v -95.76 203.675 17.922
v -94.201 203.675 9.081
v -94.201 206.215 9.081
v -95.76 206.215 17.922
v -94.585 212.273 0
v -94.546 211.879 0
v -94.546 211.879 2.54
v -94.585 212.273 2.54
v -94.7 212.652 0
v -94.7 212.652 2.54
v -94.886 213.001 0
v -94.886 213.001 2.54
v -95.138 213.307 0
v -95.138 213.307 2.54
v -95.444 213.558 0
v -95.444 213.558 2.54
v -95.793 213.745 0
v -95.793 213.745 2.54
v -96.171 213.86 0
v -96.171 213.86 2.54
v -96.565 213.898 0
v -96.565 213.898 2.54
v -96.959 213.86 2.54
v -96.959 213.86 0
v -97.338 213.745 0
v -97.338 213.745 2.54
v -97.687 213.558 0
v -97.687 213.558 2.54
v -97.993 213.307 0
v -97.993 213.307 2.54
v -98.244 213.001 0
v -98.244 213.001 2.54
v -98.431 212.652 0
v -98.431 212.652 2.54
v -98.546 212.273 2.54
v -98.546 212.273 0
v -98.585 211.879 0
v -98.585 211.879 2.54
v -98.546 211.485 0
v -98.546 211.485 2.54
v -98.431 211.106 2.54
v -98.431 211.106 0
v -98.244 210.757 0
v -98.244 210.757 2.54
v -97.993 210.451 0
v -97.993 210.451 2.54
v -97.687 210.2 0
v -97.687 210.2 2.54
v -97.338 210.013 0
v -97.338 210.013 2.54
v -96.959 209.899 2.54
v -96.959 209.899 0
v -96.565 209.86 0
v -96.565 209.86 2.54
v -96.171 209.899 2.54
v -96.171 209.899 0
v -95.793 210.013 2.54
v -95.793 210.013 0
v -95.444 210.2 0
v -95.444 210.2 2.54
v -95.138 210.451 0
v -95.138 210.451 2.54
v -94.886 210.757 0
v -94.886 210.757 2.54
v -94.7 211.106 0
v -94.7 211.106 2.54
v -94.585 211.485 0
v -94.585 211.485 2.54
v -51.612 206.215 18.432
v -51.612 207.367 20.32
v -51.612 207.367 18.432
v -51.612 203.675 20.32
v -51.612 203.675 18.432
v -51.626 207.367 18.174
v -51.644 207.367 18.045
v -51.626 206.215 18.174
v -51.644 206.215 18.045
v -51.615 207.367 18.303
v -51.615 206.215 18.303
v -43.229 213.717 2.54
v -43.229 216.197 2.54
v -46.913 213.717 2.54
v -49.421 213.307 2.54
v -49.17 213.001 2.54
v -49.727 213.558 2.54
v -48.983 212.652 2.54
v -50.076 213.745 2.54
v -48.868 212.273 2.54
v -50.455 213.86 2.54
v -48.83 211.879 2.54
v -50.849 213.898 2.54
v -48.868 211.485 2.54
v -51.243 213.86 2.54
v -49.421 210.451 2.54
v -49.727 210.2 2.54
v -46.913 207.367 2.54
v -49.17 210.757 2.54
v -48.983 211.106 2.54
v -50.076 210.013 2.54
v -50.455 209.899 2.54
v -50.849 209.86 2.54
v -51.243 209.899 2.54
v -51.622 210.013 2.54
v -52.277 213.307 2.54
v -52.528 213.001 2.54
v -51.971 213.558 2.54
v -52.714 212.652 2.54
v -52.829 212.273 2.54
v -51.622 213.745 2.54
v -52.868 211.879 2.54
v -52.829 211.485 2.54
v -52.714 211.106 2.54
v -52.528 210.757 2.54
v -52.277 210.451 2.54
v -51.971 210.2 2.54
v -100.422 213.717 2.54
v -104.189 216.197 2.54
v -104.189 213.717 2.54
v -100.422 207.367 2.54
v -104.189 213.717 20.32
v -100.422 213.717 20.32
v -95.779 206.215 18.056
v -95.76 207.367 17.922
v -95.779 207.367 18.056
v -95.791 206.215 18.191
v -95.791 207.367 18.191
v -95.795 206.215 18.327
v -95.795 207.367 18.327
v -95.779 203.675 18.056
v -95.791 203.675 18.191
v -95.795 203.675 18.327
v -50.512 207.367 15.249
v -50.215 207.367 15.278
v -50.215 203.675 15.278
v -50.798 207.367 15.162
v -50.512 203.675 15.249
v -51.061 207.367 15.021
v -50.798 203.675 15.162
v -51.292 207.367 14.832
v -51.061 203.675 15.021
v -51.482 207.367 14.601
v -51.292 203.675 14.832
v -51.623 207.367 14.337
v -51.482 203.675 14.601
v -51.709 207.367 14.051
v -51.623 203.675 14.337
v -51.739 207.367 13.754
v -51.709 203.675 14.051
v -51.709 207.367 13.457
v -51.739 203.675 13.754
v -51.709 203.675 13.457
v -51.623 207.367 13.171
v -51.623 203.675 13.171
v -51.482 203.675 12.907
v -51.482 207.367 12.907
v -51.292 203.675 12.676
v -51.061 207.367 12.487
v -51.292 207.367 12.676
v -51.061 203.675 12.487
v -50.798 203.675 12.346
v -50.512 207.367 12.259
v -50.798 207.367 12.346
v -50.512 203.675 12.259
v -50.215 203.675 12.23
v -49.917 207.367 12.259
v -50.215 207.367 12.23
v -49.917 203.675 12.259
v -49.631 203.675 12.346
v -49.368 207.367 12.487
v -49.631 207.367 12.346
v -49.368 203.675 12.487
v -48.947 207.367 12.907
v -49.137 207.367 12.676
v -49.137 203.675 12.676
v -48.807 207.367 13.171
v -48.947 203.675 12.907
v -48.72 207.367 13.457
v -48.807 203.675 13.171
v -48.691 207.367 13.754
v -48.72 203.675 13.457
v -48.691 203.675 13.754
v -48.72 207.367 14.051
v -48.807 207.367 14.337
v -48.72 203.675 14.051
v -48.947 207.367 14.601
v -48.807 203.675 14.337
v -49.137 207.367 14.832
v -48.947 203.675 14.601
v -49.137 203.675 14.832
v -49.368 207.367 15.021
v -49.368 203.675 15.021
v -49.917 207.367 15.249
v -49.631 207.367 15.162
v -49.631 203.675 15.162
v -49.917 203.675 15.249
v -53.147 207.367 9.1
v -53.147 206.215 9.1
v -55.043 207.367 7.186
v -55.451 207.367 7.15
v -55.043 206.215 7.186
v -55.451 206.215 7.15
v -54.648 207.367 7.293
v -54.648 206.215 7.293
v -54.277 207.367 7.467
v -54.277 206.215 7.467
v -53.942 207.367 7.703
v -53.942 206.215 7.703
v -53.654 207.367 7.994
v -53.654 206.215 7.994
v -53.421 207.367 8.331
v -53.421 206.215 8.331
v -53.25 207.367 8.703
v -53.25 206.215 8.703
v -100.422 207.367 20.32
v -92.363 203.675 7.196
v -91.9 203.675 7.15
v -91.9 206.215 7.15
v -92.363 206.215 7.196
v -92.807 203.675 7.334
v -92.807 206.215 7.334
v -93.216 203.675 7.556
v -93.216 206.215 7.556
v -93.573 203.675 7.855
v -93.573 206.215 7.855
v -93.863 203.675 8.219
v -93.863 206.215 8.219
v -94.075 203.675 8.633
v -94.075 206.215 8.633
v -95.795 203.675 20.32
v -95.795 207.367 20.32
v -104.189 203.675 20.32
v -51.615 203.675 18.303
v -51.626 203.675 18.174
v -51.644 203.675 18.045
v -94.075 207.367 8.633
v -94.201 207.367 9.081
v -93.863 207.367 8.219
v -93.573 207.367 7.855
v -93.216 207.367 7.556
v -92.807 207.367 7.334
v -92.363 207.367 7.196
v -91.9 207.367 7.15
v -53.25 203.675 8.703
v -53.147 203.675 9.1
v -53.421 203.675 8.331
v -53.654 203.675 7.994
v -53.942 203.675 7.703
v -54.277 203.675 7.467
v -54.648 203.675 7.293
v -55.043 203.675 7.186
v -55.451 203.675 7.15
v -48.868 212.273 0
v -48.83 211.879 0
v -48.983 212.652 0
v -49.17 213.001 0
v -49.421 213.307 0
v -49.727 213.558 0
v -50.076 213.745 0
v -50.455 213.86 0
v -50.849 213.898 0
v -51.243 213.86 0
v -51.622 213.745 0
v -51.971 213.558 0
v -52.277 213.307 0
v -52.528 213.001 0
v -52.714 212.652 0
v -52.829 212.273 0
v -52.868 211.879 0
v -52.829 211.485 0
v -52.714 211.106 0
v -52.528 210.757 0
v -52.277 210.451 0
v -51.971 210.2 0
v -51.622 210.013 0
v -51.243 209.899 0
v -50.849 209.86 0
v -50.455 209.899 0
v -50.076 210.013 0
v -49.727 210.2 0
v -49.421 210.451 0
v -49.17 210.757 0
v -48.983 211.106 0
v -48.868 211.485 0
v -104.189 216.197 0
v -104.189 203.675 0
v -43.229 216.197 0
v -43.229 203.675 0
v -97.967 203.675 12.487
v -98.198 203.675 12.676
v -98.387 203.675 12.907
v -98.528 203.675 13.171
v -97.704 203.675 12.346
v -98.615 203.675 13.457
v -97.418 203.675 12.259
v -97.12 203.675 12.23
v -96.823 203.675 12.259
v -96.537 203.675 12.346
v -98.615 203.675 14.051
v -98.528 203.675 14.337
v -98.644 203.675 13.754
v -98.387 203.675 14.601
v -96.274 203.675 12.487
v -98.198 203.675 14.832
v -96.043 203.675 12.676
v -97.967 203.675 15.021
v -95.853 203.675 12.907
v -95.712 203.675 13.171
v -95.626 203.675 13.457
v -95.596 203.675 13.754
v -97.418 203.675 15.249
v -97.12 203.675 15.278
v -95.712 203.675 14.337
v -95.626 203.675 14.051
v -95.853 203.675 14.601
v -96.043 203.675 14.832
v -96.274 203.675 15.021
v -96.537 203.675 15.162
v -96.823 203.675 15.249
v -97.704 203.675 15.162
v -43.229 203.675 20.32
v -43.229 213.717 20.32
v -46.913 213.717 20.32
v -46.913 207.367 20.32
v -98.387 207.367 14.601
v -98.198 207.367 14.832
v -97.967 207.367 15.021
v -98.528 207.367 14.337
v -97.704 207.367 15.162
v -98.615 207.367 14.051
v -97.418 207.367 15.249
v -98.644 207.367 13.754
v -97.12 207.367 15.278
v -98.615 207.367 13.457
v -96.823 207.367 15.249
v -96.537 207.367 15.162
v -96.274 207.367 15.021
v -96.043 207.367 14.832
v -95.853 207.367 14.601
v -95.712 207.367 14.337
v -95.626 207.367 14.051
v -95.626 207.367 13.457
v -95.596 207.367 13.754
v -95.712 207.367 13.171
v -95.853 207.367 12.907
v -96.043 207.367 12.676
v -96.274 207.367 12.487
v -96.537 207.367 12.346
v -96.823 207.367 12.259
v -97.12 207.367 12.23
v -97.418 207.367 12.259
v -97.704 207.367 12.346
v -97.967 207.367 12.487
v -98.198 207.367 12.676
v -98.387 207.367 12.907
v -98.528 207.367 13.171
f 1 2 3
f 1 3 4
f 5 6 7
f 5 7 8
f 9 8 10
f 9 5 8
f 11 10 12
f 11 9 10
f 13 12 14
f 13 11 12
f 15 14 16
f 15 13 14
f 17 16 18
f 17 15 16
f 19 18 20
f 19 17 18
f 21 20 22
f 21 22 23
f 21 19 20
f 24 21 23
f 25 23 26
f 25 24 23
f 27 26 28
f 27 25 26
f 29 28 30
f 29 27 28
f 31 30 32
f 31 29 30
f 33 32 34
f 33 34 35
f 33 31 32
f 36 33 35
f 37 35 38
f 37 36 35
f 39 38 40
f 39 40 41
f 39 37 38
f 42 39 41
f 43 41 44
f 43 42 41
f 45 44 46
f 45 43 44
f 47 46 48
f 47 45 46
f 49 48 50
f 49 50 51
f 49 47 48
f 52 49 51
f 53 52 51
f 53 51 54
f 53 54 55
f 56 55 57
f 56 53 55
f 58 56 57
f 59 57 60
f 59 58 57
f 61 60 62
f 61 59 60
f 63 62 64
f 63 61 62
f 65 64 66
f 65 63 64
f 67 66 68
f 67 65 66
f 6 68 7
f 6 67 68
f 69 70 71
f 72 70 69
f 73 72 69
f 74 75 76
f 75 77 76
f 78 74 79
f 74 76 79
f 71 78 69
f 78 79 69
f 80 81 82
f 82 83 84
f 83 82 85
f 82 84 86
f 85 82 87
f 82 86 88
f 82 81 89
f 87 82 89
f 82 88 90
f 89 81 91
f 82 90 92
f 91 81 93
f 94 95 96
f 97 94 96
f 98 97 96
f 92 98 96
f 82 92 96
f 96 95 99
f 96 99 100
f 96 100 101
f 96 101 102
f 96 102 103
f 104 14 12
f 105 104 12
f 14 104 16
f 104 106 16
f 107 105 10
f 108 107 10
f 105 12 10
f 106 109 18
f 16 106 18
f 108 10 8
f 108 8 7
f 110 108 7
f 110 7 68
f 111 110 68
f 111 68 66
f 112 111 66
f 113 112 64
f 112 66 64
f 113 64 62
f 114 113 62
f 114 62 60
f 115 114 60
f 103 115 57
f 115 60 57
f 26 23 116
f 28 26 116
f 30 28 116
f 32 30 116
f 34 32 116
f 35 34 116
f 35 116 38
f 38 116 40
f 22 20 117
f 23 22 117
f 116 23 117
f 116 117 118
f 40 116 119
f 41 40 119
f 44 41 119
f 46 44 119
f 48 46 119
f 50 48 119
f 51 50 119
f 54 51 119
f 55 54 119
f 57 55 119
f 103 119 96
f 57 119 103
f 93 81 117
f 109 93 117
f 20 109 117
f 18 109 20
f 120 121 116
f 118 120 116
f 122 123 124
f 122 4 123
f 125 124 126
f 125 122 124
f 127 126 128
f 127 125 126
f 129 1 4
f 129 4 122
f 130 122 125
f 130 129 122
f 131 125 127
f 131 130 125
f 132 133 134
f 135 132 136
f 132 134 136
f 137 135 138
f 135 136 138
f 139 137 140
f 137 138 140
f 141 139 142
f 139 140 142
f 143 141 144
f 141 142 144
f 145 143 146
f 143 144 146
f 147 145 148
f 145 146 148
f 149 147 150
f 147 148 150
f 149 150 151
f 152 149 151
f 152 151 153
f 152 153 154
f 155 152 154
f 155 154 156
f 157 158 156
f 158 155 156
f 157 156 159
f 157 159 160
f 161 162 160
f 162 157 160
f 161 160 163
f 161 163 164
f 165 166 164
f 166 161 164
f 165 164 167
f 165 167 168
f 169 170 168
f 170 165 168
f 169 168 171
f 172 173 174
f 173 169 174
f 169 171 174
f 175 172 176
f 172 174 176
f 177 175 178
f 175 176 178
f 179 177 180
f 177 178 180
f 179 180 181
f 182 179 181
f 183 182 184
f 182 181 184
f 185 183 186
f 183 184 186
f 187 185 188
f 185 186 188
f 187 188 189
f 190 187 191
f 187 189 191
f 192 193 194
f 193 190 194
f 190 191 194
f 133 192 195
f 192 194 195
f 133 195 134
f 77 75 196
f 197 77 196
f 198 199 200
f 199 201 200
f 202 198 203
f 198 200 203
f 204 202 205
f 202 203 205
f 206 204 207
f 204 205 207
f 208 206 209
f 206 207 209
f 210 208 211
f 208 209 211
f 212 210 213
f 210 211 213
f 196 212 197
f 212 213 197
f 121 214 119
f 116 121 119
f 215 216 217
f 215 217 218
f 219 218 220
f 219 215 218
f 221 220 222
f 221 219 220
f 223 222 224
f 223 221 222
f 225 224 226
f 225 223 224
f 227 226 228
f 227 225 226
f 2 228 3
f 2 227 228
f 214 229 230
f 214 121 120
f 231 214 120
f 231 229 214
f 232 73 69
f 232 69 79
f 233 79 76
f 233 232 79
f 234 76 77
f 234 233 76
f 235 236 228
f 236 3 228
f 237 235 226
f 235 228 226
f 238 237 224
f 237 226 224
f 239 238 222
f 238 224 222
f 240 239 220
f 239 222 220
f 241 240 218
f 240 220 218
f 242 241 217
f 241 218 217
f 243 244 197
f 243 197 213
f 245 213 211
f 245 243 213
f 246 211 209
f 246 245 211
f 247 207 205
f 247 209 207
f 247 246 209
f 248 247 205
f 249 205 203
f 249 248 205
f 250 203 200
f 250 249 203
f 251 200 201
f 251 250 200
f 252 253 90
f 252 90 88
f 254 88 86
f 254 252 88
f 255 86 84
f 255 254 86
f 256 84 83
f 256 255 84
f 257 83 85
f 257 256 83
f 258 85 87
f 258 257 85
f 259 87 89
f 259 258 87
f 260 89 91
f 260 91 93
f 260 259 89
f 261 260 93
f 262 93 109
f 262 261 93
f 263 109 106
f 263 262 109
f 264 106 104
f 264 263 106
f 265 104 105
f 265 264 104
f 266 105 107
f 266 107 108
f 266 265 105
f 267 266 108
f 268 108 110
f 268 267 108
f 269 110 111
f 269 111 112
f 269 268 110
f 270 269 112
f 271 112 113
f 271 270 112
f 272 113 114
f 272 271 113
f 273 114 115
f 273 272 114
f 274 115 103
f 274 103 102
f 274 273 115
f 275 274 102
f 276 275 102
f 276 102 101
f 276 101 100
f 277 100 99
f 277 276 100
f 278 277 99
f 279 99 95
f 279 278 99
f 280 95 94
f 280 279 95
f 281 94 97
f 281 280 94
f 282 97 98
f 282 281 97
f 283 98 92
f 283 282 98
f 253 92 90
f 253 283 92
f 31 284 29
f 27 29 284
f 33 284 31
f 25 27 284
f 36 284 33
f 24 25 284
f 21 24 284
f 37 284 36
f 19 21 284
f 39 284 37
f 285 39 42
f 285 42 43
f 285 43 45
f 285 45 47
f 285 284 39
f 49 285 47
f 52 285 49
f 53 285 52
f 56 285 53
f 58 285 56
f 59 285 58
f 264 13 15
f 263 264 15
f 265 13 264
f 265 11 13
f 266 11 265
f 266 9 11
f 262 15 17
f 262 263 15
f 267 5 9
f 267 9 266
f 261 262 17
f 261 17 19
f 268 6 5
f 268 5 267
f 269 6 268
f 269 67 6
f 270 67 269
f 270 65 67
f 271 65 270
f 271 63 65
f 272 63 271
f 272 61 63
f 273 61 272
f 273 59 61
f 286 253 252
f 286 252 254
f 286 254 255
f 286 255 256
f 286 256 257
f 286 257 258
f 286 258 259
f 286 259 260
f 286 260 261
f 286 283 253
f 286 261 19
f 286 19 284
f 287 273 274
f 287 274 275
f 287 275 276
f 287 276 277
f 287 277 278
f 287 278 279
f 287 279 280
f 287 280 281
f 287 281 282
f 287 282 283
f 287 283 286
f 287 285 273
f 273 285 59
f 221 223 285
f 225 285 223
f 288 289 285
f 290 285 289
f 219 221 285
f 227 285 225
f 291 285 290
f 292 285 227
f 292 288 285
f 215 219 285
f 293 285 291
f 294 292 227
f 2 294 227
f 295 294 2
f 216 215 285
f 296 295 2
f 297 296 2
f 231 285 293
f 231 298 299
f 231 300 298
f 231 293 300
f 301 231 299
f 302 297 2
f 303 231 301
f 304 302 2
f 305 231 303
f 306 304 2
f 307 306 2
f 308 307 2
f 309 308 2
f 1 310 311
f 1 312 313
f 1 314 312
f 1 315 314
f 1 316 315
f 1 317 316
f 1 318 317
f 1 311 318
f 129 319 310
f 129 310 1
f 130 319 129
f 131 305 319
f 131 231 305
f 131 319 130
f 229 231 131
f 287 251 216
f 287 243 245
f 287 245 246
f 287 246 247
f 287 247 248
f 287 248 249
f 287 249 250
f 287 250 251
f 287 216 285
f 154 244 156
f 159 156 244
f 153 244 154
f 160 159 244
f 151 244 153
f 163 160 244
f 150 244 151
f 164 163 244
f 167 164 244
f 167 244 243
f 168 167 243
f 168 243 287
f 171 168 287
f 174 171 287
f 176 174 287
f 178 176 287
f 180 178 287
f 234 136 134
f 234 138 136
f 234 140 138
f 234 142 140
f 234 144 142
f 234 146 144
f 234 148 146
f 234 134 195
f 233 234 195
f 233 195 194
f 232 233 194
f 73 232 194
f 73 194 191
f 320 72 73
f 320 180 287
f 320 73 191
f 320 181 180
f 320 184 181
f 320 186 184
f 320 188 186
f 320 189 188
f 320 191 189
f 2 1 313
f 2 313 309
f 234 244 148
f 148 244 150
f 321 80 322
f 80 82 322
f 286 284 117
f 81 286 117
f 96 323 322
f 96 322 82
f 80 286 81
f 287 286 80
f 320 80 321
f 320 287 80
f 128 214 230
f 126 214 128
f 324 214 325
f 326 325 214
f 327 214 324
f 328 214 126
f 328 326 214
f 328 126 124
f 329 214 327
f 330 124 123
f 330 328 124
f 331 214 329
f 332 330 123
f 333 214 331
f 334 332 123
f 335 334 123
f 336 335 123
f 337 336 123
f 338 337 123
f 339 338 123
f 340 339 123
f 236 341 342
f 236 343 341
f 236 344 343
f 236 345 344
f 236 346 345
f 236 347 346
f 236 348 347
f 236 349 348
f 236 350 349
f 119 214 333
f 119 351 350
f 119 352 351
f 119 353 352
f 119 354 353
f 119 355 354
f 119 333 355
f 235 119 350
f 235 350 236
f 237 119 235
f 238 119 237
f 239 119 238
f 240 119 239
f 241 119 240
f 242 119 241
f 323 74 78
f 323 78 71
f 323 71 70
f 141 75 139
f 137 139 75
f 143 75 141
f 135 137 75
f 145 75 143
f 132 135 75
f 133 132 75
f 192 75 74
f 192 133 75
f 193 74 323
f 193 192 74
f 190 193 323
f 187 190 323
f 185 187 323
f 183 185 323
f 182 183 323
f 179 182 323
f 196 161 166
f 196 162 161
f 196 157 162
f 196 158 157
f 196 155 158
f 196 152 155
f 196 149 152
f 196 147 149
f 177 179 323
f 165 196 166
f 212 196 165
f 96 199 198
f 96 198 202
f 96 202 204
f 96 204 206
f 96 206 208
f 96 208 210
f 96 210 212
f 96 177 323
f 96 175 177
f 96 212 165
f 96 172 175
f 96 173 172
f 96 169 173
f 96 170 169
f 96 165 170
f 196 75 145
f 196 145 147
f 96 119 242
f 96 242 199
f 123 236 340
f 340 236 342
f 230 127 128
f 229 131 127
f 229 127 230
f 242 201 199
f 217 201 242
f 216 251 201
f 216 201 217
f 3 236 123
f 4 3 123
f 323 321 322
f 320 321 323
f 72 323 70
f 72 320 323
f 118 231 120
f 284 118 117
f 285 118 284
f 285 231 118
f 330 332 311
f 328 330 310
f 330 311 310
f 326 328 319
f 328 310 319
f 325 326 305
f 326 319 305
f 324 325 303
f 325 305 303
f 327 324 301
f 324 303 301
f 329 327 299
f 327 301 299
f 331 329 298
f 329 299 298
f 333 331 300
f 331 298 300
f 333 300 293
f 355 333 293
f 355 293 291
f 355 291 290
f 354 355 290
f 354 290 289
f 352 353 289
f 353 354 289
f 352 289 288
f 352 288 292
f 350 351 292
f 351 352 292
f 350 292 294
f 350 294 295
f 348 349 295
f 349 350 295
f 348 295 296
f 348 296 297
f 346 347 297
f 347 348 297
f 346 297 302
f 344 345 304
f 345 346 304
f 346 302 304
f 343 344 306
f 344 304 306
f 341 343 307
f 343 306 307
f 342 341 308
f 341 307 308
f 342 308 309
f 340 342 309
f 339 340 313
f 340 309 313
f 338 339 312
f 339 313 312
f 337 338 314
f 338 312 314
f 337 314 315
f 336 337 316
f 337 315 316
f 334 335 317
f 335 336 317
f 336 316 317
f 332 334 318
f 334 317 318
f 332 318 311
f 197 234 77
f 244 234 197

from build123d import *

# Parameters (mm, degrees)
SKETCH1_W           = 55.88
SKETCH1_H           = 9.981767046
SKETCH1_R           = 2.0193
BOSS_EXTRUDE1_DEPTH = 2.54
SKETCH2_W           = 55.88
SKETCH2_H           = 1.152145831
BOSS_EXTRUDE2_DEPTH = 17.78
SKETCH3_W           = 1.2265406
SKETCH3_H           = 17.78
SKETCH3_W_2         = 1.1438128
BOSS_EXTRUDE4_DEPTH = 6.35
SKETCH4_R           = 1.524
CUT_EXTRUDE1_DEPTH  = 105.035332272
CUT_EXTRUDE3_DEPTH  = 105.035332272
BOSS_EXTRUDE5_DEPTH = 2.54
BOSS_EXTRUDE6_DEPTH = 2.54
FILLET1_R           = 2.3368
FILLET2_R           = 2.3368
FILLET3_R           = 2.3368
FILLET4_R           = 2.3368
BOSS_EXTRUDE7_START = 2.54
SKETCH8_R           = 1.524
BOSS_EXTRUDE7_DEPTH = 2.54


with BuildPart() as part:
    # Sketch1 → Boss-Extrude1 (new body)
    with BuildSketch(Plane.XY):
        with Locations((-73.708835459, 211.206122276)):
            Rectangle(SKETCH1_W, SKETCH1_H)
        with Locations((-96.565388679, 211.879005799)):
            Circle(SKETCH1_R, mode=Mode.SUBTRACT)
        with Locations((-50.848835459, 211.879005799)):
            Circle(SKETCH1_R, mode=Mode.SUBTRACT)
    extrude(amount=BOSS_EXTRUDE1_DEPTH)

    # Sketch2 → Boss-Extrude2 (add)
    with BuildSketch(Plane.XY.offset(2.54)):
        with Locations((-73.708835459, 206.791311669)):
            Rectangle(SKETCH2_W, SKETCH2_H)
    extrude(amount=BOSS_EXTRUDE2_DEPTH)

    # Sketch3 → Boss-Extrude4 (add)
    with BuildSketch(Plane(origin=(0, 207.367384584, 0), x_dir=(1, 0, 0), z_dir=(0, 1, 0))):
        with Locations((-101.035565159, -11.43)):
            Rectangle(SKETCH3_W, SKETCH3_H)
        with Locations((-46.340741859, -11.43)):
            Rectangle(SKETCH3_W_2, SKETCH3_H)
    extrude(amount=BOSS_EXTRUDE4_DEPTH)

    # Sketch4 → Cut-Extrude1 (cut, through all)
    with BuildSketch(Plane(origin=(0, 207.367384584, 0), x_dir=(1, 0, 0), z_dir=(0, 1, 0))):
        with Locations(Location((-97.120294859, -13.7541, 0), (0, 0, 270))):
            Circle(SKETCH4_R)
        with Locations(Location((-50.214648259, -13.7541, 0), (0, 0, 270))):
            Circle(SKETCH4_R)
    extrude(amount=-CUT_EXTRUDE1_DEPTH, mode=Mode.SUBTRACT)

    # Sketch5 → Cut-Extrude3 (cut, through all)
    with BuildSketch(Plane(origin=(0, 207.367384584, 0), x_dir=(1, 0, 0), z_dir=(0, 1, 0))):
        Polygon((-53.474471559, -7.1501), (-93.860471559, -7.1501), (-95.795272253, -18.1229), (-95.795272253, -20.32), (-92.955896087, -20.32), (-62.921890572, -20.32), (-51.611648259, -20.32), (-51.611648259, -18.237455367), align=None)
    extrude(amount=-CUT_EXTRUDE3_DEPTH, mode=Mode.SUBTRACT)

    # Sketch6 → Boss-Extrude5 (add)
    with BuildSketch(Plane.ZY.offset(101.648835459)):
        Polygon((2.54, 216.197005799), (0, 216.197005799), (0, 206.215238753), (20.32, 206.215238753), (20.32, 213.717384584), (2.54, 213.717384584), align=None)
    extrude(amount=BOSS_EXTRUDE5_DEPTH)

    # Sketch7 → Boss-Extrude6 (add)
    with BuildSketch(Plane(origin=(-45.768835459, 0, 0), x_dir=(0, 0, -1), z_dir=(1, 0, 0))):
        Polygon((0, 216.197005799), (-2.54, 216.197005799), (-2.54, 213.717384584), (-20.32, 213.717384584), (-20.32, 206.215238753), (0, 206.215238753), align=None)
    extrude(amount=BOSS_EXTRUDE6_DEPTH)

    # Fillet1
    fillet1_edges = [part.edges().sort_by_distance(p)[0] for p in [
        (-93.860471559, 206.791311669, 7.1501),
    ]]
    fillet(fillet1_edges, radius=FILLET1_R)

    # Fillet2
    fillet2_edges = [part.edges().sort_by_distance(p)[0] for p in [
        (-53.474471559, 206.791311669, 7.1501),
    ]]
    fillet(fillet2_edges, radius=FILLET2_R)

    # Fillet3
    fillet3_edges = [part.edges().sort_by_distance(p)[0] for p in [
        (-95.795272253, 206.791311669, 18.1229),
    ]]
    fillet(fillet3_edges, radius=FILLET3_R)

    # Fillet4
    fillet4_edges = [part.edges().sort_by_distance(p)[0] for p in [
        (-51.611648259, 206.791311669, 18.237455367),
    ]]
    fillet(fillet4_edges, radius=FILLET4_R)

    # Sketch8 → Boss-Extrude7 (add)
    with BuildSketch(Plane.XZ.offset(-206.215238753).offset(BOSS_EXTRUDE7_START)):
        with BuildLine():
            Line((-55.451410668, 7.1501), (-91.899663541, 7.1501))
            ThreePointArc((-91.899663541, 7.1501), (-93.401729627, 7.696807345), (-94.200962298, 9.081118938))
            Line((-94.200962298, 9.081118938), (-95.75977101, 17.921562447))
            ThreePointArc((-95.75977101, 17.921562447), (-95.786380023, 18.123677969), (-95.795272253, 18.327343509))
            Line((-95.795272253, 18.327343509), (-95.795272253, 20.32))
            Line((-95.795272253, 20.32), (-104.188835459, 20.32))
            Line((-104.188835459, 20.32), (-104.188835459, 0))
            Line((-104.188835459, 0), (-43.228835459, 0))
            Line((-43.228835459, 0), (-43.228835459, 20.32))
            Line((-43.228835459, 20.32), (-51.611648259, 20.32))
            Line((-51.611648259, 20.32), (-51.611648259, 18.432395976))
            ThreePointArc((-51.611648259, 18.432395976), (-51.619737234, 18.238130166), (-51.64394816, 18.045209281))
            Line((-51.64394816, 18.045209281), (-53.14691057, 9.099713305))
            ThreePointArc((-53.14691057, 9.099713305), (-53.942129983, 7.702885971), (-55.451410668, 7.1501))
        make_face()
        with Locations(Location((-50.214648259, 13.7541, 0), (0, 0, 90))):
            Circle(SKETCH8_R, mode=Mode.SUBTRACT)
        with Locations(Location((-97.120294859, 13.7541, 0), (0, 0, 90))):
            Circle(SKETCH8_R, mode=Mode.SUBTRACT)
    extrude(amount=-BOSS_EXTRUDE7_DEPTH)


solid = part.part
